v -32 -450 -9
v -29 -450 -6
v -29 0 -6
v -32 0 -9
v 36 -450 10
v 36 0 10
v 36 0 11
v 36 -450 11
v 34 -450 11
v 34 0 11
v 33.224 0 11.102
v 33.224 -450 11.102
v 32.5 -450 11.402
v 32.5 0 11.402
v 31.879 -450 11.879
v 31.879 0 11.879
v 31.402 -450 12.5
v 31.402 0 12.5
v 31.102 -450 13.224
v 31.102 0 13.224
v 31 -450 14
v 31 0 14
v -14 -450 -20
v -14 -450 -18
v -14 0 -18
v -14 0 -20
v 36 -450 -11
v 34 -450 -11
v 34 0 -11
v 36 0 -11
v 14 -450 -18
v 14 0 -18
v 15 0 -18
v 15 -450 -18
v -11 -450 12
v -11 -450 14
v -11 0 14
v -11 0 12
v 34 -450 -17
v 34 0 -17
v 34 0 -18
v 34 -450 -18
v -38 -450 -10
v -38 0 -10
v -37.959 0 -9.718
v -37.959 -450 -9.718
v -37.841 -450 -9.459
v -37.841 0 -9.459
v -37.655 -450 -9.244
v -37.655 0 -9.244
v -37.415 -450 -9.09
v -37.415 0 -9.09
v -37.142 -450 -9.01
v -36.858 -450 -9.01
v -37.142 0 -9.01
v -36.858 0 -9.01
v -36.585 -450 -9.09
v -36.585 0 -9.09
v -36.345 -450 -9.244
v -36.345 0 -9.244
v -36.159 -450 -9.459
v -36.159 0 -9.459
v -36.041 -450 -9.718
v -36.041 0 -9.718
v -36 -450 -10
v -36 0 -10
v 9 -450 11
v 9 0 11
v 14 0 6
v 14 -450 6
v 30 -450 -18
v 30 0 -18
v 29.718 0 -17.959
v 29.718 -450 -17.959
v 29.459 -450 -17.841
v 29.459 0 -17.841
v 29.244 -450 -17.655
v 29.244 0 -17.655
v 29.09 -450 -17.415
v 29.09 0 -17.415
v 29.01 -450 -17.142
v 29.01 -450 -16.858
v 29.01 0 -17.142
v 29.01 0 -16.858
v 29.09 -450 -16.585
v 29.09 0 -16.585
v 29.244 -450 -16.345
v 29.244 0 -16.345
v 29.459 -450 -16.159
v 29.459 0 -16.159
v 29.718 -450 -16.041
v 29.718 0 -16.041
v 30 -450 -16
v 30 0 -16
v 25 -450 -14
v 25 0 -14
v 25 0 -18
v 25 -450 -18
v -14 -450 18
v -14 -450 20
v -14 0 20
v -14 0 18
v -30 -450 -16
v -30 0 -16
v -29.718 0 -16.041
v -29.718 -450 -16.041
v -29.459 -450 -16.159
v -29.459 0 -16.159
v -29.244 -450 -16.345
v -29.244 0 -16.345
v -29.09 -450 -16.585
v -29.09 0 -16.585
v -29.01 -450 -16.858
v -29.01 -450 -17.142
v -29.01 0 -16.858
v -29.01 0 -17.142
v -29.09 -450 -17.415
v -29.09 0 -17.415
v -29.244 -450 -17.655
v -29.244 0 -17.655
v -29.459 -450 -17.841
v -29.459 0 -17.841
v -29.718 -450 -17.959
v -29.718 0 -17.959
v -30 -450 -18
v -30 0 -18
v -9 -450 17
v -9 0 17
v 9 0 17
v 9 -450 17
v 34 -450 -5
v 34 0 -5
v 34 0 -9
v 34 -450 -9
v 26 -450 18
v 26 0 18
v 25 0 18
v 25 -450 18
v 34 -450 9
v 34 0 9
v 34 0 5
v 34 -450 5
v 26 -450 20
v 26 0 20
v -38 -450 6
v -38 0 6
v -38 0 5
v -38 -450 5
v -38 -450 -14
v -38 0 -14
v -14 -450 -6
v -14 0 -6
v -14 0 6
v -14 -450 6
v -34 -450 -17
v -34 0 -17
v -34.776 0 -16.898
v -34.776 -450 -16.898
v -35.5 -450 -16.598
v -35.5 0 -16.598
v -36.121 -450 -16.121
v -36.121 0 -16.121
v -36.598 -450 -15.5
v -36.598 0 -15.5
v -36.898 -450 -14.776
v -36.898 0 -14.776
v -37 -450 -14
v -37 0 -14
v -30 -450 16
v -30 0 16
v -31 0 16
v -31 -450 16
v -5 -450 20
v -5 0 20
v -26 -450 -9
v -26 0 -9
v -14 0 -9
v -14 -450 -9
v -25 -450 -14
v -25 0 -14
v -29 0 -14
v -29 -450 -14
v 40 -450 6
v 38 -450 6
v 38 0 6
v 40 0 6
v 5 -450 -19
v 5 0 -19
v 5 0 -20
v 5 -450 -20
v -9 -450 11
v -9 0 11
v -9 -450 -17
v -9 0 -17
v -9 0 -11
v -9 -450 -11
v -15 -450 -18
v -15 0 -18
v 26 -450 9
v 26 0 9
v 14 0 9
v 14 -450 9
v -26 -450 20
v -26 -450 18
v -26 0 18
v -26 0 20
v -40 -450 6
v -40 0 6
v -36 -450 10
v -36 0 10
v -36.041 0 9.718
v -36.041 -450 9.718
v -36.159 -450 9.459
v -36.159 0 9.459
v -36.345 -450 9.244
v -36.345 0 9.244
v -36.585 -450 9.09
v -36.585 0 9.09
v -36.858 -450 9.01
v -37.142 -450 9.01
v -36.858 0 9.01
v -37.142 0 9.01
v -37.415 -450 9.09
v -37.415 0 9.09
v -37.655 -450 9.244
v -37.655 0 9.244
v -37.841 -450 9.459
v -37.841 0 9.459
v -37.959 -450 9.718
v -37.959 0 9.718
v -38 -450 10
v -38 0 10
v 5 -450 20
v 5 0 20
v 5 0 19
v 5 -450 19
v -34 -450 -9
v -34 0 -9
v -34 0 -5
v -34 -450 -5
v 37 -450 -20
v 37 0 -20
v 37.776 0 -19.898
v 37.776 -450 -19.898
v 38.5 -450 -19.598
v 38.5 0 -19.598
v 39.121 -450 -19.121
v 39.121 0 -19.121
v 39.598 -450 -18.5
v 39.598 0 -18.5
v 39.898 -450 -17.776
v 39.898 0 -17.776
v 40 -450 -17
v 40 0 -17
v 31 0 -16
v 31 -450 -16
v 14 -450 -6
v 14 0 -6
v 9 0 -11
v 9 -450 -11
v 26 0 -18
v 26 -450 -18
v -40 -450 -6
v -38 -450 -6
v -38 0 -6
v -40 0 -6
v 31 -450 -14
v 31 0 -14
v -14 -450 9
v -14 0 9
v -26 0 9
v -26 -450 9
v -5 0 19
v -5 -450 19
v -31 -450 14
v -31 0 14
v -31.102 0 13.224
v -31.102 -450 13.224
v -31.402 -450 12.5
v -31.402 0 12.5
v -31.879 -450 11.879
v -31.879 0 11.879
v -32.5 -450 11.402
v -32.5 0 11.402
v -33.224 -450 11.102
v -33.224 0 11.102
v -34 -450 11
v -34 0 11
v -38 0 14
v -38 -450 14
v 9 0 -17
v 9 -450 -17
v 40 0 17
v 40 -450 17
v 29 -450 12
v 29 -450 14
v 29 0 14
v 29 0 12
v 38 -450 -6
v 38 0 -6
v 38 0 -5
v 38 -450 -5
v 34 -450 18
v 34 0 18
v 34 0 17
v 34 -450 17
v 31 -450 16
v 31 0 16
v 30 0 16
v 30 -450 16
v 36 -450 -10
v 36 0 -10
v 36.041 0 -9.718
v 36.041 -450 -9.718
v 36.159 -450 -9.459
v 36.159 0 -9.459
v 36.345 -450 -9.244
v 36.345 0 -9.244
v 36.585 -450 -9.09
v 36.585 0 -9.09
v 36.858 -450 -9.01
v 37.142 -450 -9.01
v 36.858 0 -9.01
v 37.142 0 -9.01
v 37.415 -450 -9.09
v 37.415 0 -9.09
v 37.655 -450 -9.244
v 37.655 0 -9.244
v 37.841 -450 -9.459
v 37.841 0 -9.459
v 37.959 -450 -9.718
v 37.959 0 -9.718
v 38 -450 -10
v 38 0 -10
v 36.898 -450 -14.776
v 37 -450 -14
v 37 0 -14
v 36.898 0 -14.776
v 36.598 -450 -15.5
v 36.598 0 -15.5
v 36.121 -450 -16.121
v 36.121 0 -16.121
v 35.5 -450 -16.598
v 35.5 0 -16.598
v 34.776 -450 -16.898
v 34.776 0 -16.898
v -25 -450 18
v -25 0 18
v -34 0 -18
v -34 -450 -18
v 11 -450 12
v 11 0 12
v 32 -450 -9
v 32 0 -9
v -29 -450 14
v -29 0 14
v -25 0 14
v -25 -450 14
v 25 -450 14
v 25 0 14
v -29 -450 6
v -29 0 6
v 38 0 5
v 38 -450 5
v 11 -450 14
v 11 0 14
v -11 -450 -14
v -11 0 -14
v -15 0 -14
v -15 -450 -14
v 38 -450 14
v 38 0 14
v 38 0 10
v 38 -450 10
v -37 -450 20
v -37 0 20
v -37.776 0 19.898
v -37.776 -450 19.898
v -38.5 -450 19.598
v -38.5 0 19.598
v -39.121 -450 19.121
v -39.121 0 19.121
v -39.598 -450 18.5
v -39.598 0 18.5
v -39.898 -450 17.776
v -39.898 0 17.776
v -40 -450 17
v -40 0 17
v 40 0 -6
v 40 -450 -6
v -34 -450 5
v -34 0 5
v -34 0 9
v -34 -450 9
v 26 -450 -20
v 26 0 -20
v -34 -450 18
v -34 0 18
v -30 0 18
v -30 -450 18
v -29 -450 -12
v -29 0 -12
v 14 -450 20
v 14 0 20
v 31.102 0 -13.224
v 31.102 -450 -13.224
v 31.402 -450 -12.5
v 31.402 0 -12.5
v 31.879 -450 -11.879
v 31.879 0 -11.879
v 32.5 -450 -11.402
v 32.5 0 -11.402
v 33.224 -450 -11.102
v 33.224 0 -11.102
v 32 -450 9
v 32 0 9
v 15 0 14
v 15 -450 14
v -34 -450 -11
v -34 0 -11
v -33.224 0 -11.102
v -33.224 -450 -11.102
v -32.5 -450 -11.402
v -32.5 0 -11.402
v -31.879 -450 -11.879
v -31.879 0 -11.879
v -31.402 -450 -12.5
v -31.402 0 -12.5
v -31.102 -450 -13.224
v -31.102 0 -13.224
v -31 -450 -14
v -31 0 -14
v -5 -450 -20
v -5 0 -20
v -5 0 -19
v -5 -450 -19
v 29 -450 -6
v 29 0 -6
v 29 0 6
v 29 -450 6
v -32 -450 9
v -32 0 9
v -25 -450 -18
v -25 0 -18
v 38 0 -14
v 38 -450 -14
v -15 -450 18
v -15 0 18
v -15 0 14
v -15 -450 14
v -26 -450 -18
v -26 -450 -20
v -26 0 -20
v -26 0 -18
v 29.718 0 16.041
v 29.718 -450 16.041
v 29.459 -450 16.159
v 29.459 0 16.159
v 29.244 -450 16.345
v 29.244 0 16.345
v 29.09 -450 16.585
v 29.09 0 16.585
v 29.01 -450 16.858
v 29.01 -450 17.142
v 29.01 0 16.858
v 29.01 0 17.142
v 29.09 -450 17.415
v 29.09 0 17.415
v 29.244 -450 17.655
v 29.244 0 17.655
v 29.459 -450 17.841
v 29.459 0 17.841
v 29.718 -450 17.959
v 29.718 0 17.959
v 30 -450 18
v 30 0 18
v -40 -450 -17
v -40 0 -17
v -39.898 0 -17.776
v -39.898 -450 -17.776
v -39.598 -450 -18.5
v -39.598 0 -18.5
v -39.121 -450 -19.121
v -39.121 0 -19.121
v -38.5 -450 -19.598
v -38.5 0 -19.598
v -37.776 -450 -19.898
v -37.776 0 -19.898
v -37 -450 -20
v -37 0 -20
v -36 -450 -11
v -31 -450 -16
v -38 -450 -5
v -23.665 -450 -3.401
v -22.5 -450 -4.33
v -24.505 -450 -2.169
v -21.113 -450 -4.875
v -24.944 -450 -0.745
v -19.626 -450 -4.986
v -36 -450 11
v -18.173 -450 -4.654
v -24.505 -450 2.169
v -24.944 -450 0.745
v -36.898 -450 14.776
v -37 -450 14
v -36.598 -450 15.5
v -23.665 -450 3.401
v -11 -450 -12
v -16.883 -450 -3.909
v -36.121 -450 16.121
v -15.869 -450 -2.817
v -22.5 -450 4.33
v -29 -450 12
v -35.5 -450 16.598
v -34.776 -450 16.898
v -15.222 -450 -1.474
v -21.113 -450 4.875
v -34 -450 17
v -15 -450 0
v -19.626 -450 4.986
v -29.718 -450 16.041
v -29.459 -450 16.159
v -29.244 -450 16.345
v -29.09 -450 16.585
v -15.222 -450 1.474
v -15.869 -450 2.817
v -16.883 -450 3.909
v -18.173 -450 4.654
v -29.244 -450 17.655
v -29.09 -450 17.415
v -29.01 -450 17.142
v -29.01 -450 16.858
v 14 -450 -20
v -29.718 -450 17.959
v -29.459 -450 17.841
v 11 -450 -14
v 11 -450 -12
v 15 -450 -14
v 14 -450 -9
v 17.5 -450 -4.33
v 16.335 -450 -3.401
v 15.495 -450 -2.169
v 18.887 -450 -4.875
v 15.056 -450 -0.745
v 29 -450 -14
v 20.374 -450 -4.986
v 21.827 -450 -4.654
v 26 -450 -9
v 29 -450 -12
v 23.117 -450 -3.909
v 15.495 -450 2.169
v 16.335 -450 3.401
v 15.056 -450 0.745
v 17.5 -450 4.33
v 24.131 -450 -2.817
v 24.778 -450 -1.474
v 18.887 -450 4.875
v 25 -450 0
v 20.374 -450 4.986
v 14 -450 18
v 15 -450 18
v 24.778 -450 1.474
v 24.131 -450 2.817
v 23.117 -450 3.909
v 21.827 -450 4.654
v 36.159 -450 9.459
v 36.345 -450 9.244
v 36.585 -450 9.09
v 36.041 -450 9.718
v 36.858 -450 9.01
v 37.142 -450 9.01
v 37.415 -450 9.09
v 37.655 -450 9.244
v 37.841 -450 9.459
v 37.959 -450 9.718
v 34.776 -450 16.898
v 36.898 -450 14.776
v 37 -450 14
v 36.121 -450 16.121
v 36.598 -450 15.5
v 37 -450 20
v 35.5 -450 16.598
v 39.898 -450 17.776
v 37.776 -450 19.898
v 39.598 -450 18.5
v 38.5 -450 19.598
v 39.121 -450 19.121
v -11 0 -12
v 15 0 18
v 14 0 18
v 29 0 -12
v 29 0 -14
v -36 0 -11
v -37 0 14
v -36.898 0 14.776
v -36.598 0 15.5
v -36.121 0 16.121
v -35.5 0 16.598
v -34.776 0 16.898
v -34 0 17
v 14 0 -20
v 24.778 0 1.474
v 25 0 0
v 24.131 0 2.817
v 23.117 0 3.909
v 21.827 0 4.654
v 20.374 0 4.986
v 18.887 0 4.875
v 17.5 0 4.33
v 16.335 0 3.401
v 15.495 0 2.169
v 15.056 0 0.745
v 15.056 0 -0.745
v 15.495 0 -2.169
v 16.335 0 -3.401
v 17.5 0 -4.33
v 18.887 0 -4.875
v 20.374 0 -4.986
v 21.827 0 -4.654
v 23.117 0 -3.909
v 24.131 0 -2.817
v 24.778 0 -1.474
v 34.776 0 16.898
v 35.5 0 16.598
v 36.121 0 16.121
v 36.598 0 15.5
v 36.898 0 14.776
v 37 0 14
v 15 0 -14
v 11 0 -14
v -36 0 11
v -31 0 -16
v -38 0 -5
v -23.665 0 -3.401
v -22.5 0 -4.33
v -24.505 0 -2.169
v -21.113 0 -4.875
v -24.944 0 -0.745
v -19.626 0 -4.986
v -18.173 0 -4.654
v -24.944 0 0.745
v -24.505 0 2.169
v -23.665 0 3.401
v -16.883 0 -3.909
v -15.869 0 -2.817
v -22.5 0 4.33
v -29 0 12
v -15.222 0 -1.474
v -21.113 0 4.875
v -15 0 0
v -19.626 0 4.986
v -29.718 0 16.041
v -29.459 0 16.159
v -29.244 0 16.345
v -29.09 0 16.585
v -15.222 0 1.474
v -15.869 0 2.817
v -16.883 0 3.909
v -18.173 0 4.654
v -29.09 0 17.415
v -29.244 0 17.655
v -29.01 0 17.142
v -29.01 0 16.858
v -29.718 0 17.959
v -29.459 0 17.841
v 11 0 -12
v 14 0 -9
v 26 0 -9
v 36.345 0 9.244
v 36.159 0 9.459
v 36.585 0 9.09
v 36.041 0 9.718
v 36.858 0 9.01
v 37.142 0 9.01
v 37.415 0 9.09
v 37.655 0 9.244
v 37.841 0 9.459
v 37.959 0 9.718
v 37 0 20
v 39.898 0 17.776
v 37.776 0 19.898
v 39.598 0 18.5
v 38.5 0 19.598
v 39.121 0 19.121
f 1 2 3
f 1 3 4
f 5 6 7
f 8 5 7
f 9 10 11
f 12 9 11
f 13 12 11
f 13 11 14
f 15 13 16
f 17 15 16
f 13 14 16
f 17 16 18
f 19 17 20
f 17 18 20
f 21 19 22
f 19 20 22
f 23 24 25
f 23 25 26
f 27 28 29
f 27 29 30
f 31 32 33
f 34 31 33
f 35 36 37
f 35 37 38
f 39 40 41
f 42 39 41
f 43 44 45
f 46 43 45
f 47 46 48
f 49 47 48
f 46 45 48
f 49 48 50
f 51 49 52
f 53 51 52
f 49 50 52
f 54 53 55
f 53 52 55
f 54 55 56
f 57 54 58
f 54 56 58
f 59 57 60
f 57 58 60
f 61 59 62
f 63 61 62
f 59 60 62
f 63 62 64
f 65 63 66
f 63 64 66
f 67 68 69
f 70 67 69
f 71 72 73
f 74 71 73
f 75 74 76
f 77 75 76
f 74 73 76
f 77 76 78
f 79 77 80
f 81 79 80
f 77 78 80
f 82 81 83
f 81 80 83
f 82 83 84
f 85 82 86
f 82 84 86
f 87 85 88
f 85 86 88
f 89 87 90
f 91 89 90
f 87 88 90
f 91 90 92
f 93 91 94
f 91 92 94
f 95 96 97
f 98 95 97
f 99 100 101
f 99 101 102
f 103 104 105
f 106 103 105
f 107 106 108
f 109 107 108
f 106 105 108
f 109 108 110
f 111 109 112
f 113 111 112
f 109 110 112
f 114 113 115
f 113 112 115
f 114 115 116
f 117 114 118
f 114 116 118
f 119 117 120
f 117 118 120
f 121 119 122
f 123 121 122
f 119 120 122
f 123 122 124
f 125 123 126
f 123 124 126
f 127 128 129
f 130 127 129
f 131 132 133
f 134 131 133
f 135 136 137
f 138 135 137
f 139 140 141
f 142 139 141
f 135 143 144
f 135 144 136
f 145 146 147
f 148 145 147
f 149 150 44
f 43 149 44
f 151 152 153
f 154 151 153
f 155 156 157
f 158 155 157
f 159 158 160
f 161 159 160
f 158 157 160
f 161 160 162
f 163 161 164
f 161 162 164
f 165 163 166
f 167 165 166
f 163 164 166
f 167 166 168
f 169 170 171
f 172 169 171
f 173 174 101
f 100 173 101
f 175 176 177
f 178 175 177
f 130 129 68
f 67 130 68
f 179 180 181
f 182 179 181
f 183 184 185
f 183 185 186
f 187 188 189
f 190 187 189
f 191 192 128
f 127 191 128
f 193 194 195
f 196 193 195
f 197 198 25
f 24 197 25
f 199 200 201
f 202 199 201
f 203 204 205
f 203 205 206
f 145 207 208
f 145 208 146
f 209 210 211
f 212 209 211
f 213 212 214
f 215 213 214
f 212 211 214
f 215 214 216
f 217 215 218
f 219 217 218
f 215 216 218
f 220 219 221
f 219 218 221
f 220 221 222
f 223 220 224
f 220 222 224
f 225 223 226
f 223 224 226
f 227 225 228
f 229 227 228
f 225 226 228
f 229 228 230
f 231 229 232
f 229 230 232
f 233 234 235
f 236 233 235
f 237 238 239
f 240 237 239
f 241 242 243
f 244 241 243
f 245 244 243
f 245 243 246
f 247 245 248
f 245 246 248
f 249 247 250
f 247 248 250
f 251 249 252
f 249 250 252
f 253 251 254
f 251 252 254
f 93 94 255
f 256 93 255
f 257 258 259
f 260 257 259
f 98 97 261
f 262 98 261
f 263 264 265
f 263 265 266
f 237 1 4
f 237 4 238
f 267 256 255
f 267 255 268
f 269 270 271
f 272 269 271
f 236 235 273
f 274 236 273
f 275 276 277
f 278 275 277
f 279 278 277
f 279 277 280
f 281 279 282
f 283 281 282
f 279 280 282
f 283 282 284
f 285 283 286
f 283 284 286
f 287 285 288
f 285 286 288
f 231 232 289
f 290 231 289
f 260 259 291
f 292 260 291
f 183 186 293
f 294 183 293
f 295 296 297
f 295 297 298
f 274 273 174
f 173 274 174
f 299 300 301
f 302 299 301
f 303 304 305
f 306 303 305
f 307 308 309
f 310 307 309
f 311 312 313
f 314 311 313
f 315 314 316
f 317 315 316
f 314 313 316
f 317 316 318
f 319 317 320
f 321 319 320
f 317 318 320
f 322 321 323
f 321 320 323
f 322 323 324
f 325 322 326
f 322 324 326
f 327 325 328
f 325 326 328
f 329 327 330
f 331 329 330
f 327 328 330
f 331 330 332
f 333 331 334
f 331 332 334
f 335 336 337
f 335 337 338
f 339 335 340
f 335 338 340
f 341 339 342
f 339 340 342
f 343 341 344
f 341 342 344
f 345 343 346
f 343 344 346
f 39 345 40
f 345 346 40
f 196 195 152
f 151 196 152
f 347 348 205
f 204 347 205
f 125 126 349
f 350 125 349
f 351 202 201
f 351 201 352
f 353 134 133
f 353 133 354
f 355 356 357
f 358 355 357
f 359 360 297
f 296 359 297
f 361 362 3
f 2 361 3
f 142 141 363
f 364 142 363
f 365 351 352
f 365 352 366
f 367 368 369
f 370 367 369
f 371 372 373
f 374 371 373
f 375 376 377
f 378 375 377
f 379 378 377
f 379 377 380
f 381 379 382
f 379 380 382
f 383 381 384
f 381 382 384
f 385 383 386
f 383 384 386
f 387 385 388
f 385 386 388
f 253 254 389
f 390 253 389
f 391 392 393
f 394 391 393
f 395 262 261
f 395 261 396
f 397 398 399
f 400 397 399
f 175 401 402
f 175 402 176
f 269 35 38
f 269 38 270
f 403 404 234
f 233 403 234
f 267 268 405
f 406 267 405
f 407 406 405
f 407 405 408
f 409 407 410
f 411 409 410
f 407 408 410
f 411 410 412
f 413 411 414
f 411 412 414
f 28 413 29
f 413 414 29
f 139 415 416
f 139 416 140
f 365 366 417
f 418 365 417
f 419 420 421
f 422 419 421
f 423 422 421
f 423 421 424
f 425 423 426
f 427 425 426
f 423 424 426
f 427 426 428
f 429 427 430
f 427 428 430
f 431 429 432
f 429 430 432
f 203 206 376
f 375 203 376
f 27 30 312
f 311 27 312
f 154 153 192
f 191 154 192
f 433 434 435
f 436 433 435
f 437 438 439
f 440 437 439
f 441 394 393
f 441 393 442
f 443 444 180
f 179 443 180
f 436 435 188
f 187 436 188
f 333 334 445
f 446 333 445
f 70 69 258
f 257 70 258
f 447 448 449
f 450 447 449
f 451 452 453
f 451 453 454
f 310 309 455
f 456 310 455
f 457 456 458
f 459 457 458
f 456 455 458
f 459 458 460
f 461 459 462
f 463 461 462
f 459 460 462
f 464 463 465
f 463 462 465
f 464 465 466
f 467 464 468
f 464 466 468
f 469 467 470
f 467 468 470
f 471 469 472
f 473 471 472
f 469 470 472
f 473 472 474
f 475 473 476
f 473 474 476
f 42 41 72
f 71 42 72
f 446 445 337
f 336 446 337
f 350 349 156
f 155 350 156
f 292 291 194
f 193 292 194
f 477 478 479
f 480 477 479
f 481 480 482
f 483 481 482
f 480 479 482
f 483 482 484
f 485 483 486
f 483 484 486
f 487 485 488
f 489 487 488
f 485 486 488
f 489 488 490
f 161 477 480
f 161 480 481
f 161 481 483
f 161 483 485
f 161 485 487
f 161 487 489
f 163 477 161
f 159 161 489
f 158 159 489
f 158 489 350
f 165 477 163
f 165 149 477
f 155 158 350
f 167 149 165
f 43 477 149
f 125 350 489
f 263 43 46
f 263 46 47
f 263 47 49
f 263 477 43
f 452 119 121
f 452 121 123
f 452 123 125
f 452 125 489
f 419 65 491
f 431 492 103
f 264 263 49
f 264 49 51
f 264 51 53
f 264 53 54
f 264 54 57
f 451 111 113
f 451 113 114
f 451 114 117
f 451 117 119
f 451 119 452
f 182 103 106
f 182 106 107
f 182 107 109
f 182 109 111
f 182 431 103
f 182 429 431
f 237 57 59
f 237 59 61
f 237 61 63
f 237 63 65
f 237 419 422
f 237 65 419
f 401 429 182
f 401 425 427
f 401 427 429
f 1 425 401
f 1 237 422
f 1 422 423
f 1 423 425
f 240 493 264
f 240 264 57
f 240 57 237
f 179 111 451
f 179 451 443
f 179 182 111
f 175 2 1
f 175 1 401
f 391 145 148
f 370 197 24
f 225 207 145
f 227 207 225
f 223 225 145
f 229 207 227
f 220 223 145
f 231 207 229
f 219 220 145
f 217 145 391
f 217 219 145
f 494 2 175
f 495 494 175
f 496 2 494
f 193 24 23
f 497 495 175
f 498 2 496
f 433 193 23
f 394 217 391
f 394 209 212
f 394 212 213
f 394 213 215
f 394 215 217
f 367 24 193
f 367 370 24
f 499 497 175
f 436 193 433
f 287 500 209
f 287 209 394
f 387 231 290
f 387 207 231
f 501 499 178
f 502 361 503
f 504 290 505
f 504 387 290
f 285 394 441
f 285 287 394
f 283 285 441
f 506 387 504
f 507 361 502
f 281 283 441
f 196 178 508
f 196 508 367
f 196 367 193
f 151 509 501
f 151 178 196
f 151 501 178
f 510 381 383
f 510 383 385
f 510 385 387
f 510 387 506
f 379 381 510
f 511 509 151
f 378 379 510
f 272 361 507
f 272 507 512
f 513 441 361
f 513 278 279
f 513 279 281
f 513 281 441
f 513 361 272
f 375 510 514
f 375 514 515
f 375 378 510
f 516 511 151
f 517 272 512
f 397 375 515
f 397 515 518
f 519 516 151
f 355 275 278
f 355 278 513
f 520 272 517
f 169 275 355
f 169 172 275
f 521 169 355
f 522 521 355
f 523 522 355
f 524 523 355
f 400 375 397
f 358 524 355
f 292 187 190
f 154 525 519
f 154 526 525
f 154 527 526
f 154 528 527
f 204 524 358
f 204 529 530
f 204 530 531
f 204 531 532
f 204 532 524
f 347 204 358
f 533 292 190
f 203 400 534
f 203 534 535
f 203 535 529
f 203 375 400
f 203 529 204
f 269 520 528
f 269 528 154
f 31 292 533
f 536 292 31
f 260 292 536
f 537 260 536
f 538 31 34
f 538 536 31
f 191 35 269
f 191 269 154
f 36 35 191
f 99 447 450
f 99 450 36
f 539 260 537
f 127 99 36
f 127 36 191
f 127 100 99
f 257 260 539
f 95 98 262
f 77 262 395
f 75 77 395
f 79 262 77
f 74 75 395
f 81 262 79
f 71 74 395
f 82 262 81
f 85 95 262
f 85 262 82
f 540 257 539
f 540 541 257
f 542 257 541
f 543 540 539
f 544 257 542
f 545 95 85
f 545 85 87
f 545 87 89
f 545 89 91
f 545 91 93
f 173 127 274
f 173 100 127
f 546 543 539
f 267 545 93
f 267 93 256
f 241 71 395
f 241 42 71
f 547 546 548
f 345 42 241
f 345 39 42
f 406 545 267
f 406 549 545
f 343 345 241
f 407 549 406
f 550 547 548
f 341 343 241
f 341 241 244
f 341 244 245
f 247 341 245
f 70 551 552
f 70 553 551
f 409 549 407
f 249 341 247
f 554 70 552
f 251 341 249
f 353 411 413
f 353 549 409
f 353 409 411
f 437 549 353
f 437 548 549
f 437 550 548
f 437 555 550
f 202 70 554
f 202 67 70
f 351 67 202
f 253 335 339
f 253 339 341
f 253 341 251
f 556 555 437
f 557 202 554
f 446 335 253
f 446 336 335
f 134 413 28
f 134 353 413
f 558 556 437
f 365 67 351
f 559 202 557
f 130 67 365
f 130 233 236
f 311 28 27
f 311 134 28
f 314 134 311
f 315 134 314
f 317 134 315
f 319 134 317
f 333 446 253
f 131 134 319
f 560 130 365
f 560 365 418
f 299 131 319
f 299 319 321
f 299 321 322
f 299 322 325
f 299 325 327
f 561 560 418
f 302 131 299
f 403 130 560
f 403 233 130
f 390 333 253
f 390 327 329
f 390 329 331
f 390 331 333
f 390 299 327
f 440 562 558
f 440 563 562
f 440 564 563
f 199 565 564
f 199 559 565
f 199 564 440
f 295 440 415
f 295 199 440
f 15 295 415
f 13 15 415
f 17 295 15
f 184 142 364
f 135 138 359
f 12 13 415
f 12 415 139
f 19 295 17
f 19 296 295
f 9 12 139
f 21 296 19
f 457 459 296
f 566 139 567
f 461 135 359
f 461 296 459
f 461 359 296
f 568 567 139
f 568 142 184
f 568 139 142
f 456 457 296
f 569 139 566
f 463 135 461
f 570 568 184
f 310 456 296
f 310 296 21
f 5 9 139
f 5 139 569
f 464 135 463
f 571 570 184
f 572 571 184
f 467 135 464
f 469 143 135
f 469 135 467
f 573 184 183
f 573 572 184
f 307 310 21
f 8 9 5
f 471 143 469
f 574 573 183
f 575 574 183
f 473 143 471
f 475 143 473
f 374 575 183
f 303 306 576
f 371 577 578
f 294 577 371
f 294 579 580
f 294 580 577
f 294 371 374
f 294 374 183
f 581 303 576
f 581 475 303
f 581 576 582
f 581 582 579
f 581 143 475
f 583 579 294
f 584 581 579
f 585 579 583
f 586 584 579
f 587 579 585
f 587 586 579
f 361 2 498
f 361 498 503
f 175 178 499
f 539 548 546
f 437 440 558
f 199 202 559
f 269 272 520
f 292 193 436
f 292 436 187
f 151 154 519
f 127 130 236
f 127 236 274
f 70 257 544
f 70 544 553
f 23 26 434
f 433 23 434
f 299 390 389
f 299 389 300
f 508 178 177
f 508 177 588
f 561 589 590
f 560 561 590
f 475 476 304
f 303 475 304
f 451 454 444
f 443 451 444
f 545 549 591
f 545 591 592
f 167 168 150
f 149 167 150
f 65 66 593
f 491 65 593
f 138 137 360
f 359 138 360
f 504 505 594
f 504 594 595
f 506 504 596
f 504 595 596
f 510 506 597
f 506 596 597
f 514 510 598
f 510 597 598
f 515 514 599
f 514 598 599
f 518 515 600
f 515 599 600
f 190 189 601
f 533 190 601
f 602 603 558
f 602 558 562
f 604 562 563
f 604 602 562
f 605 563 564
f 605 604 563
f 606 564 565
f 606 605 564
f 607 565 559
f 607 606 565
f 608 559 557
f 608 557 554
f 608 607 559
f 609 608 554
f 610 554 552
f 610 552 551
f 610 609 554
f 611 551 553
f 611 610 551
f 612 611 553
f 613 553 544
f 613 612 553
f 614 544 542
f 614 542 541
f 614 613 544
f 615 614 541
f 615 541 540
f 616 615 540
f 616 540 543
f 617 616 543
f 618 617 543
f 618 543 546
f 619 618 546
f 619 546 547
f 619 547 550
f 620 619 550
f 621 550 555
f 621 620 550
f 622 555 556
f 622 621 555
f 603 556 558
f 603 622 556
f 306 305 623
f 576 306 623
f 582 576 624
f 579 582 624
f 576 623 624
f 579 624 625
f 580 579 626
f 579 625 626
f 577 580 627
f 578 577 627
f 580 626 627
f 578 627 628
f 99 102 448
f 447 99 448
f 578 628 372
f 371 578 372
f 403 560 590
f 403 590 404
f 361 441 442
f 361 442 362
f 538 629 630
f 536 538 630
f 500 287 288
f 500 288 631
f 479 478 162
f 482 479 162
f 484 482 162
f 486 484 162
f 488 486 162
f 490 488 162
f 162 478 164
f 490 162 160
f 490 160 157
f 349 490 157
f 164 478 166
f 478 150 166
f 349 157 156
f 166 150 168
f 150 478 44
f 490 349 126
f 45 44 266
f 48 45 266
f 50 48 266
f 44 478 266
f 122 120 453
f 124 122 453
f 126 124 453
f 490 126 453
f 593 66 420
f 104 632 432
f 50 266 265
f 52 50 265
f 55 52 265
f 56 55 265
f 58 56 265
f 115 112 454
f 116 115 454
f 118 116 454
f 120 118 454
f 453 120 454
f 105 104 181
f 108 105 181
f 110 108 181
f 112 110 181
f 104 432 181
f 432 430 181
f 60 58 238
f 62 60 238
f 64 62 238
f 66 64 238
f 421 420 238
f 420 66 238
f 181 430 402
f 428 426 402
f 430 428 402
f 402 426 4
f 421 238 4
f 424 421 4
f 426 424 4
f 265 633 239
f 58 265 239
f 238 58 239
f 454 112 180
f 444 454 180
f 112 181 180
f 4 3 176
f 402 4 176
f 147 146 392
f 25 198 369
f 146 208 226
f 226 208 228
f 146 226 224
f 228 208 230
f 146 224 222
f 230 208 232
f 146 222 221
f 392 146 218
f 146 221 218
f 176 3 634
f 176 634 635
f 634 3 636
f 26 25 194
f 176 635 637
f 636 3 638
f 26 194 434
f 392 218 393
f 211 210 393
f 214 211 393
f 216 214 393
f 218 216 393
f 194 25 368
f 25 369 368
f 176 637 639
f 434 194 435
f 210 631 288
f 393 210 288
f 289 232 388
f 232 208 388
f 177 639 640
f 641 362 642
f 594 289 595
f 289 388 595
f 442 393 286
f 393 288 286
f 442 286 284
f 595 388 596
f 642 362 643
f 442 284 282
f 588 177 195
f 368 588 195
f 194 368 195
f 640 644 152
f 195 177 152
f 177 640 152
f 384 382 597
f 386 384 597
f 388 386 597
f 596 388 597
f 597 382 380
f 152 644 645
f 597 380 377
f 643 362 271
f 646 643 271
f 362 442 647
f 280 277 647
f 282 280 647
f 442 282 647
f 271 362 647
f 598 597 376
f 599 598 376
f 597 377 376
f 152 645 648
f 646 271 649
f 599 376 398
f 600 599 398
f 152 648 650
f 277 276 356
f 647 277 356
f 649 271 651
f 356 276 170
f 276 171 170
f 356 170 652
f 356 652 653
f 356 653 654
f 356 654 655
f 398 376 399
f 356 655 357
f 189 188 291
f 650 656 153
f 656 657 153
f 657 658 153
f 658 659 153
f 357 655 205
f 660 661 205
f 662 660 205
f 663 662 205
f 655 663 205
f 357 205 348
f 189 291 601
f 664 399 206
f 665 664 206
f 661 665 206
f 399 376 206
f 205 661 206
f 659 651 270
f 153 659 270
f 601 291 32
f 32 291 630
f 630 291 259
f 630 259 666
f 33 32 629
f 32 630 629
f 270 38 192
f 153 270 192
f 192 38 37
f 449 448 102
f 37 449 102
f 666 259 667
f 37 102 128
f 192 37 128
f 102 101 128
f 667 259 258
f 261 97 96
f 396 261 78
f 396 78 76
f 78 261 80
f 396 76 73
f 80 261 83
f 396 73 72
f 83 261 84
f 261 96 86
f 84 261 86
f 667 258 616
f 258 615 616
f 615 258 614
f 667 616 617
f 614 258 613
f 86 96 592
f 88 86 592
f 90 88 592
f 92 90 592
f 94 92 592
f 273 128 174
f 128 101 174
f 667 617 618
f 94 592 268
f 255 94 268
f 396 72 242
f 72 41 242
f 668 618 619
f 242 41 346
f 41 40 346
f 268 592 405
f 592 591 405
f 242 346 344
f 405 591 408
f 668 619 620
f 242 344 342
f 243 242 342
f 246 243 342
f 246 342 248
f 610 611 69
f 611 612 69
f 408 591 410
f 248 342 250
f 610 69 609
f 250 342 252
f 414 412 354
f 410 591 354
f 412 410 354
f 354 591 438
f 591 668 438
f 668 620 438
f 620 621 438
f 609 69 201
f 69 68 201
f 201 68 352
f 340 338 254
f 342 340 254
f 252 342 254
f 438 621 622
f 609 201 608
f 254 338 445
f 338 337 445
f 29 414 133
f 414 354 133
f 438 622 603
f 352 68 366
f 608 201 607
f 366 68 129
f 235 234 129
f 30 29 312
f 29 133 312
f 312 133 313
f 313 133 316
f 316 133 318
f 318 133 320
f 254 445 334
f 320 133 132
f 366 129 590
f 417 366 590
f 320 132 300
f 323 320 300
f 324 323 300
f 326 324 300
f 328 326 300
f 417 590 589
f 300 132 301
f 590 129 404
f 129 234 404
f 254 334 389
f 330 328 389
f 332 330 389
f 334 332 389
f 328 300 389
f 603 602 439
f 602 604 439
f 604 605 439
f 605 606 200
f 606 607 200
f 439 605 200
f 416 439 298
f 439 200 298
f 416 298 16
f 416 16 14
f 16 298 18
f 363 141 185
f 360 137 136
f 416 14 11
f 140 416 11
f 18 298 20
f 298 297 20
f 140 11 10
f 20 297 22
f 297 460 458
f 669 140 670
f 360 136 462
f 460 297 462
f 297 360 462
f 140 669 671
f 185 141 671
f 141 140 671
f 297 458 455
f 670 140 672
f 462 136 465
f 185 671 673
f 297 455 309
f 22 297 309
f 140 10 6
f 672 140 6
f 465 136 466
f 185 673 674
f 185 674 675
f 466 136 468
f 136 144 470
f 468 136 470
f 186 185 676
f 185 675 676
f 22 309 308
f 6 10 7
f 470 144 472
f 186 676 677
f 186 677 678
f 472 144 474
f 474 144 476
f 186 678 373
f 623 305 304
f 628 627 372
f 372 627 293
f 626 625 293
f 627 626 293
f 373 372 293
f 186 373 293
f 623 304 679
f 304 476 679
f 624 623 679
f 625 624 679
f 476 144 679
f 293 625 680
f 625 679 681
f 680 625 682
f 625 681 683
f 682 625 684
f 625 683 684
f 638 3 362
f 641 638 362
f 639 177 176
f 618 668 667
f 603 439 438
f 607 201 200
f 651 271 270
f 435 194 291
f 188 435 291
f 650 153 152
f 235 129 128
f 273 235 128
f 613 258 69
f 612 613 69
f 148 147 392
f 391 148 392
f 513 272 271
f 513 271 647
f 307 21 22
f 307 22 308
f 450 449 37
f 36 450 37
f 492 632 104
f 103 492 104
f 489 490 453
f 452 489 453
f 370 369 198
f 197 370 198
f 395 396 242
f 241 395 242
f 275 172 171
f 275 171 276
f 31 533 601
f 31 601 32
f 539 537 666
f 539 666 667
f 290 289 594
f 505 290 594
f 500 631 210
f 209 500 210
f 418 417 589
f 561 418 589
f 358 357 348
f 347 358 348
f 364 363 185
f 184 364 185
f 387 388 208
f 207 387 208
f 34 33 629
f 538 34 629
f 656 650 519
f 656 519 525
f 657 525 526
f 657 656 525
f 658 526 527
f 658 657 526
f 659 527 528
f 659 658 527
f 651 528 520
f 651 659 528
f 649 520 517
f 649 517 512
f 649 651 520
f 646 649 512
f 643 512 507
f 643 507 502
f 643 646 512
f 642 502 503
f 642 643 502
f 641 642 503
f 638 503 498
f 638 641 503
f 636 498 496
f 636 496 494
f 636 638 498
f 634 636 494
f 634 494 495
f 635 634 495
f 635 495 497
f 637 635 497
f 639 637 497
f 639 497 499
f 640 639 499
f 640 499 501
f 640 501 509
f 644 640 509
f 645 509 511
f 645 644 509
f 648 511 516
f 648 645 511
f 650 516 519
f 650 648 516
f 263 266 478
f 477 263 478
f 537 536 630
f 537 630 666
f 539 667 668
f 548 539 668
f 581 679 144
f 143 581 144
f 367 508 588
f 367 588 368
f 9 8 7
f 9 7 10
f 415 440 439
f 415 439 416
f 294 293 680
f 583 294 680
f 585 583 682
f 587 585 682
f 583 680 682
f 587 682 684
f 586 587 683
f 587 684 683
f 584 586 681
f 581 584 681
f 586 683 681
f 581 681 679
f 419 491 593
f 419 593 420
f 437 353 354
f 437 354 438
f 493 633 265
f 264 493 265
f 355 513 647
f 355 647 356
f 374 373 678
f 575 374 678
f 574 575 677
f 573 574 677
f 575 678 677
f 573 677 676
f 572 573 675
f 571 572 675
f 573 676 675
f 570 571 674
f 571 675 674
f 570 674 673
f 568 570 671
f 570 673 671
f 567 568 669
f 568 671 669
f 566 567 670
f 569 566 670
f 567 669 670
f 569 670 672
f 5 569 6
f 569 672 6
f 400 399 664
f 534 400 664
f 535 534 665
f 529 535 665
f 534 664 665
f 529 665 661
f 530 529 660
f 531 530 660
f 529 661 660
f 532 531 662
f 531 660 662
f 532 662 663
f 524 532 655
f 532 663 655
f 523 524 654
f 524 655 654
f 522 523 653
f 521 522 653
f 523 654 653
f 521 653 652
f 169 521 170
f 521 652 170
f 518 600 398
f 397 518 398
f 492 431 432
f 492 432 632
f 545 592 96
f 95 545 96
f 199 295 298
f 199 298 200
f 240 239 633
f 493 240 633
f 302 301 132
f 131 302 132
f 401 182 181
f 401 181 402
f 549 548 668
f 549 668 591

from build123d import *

# Parameters (mm, degrees)
F1_R     = 5
F2_DEPTH = 450


with BuildPart() as f2:
    # F1 (on Front) → F2 (new body)
    with BuildSketch(Plane.XZ):
        with BuildLine():
            Line((-38, 6), (-38, 5))
            Line((-38, 5), (-34, 5))
            Line((-34, 5), (-34, 9))
            Line((-34, 9), (-32, 9))
            Line((-32, 9), (-29, 6))
            Line((-29, 6), (-29, -6))
            Line((-29, -6), (-32, -9))
            Line((-32, -9), (-34, -9))
            Line((-34, -9), (-34, -5))
            Line((-34, -5), (-38, -5))
            Line((-38, -5), (-38, -6))
            Line((-38, -6), (-40, -6))
            Line((-40, -6), (-40, -17))
            ThreePointArc((-40, -17), (-39.1213203436, -19.1213203436), (-37, -20))
            Line((-37, -20), (-26, -20))
            Line((-26, -20), (-26, -18))
            Line((-26, -18), (-25, -18))
            Line((-25, -18), (-25, -14))
            Line((-25, -14), (-29, -14))
            Line((-29, -14), (-29, -12))
            Line((-29, -12), (-26, -9))
            Line((-26, -9), (-14, -9))
            Line((-14, -9), (-11, -12))
            Line((-11, -12), (-11, -14))
            Line((-11, -14), (-15, -14))
            Line((-15, -14), (-15, -18))
            Line((-15, -18), (-14, -18))
            Line((-14, -18), (-14, -20))
            Line((-14, -20), (-5, -20))
            Line((-5, -20), (-5, -19))
            Line((-5, -19), (5, -19))
            Line((5, -19), (5, -20))
            Line((5, -20), (14, -20))
            Line((14, -20), (14, -18))
            Line((14, -18), (15, -18))
            Line((15, -18), (15, -14))
            Line((15, -14), (11, -14))
            Line((11, -14), (11, -12))
            Line((11, -12), (14, -9))
            Line((14, -9), (26, -9))
            Line((26, -9), (29, -12))
            Line((29, -12), (29, -14))
            Line((29, -14), (25, -14))
            Line((25, -14), (25, -18))
            Line((25, -18), (26, -18))
            Line((26, -18), (26, -20))
            Line((26, -20), (37, -20))
            ThreePointArc((37, -20), (39.1213203436, -19.1213203436), (40, -17))
            Line((40, -17), (40, -6))
            Line((40, -6), (38, -6))
            Line((38, -6), (38, -5))
            Line((38, -5), (34, -5))
            Line((34, -5), (34, -9))
            Line((34, -9), (32, -9))
            Line((32, -9), (29, -6))
            Line((29, -6), (29, 6))
            Line((29, 6), (32, 9))
            Line((32, 9), (34, 9))
            Line((34, 9), (34, 5))
            Line((34, 5), (38, 5))
            Line((38, 5), (38, 6))
            Line((38, 6), (40, 6))
            Line((40, 6), (40, 17))
            ThreePointArc((40, 17), (39.1213203436, 19.1213203436), (37, 20))
            Line((37, 20), (26, 20))
            Line((26, 20), (26, 18))
            Line((26, 18), (25, 18))
            Line((25, 18), (25, 14))
            Line((25, 14), (29, 14))
            Line((29, 14), (29, 12))
            Line((29, 12), (26, 9))
            Line((26, 9), (14, 9))
            Line((14, 9), (11, 12))
            Line((11, 12), (11, 14))
            Line((11, 14), (15, 14))
            Line((15, 14), (15, 18))
            Line((15, 18), (14, 18))
            Line((14, 18), (14, 20))
            Line((14, 20), (5, 20))
            Line((5, 20), (5, 19))
            Line((5, 19), (-5, 19))
            Line((-5, 19), (-5, 20))
            Line((-5, 20), (-14, 20))
            Line((-14, 20), (-14, 18))
            Line((-14, 18), (-15, 18))
            Line((-15, 18), (-15, 14))
            Line((-15, 14), (-11, 14))
            Line((-11, 14), (-11, 12))
            Line((-11, 12), (-14, 9))
            Line((-14, 9), (-26, 9))
            Line((-26, 9), (-29, 12))
            Line((-29, 12), (-29, 14))
            Line((-29, 14), (-25, 14))
            Line((-25, 14), (-25, 18))
            Line((-25, 18), (-26, 18))
            Line((-26, 18), (-26, 20))
            Line((-26, 20), (-37, 20))
            ThreePointArc((-37, 20), (-39.1213203436, 19.1213203436), (-40, 17))
            Line((-40, 17), (-40, 6))
            Line((-40, 6), (-38, 6))
        make_face()
        with BuildLine():
            ThreePointArc((-30, -16), (-29, -17), (-30, -18))
            Line((-30, -18), (-34, -18))
            Line((-34, -18), (-34, -17))
            ThreePointArc((-34, -17), (-36.1213203436, -16.1213203436), (-37, -14))
            Line((-37, -14), (-38, -14))
            Line((-38, -14), (-38, -10))
            ThreePointArc((-38, -10), (-37, -9), (-36, -10))
            Line((-36, -10), (-36, -11))
            Line((-36, -11), (-34, -11))
            ThreePointArc((-34, -11), (-31.8786796564, -11.8786796564), (-31, -14))
            Line((-31, -14), (-31, -16))
            Line((-31, -16), (-30, -16))
        make_face(mode=Mode.SUBTRACT)
        with BuildLine():
            ThreePointArc((36, -10), (37, -9), (38, -10))
            Line((38, -10), (38, -14))
            Line((38, -14), (37, -14))
            ThreePointArc((37, -14), (36.1213203436, -16.1213203436), (34, -17))
            Line((34, -17), (34, -18))
            Line((34, -18), (30, -18))
            ThreePointArc((30, -18), (29, -17), (30, -16))
            Line((30, -16), (31, -16))
            Line((31, -16), (31, -14))
            ThreePointArc((31, -14), (31.8786796564, -11.8786796564), (34, -11))
            Line((34, -11), (36, -11))
            Line((36, -11), (36, -10))
        make_face(mode=Mode.SUBTRACT)
        with Locations((-20, 0)):
            Circle(F1_R, mode=Mode.SUBTRACT)
        with BuildLine():
            ThreePointArc((-36, 10), (-37, 9), (-38, 10))
            Line((-38, 10), (-38, 14))
            Line((-38, 14), (-37, 14))
            ThreePointArc((-37, 14), (-36.1213203436, 16.1213203436), (-34, 17))
            Line((-34, 17), (-34, 18))
            Line((-34, 18), (-30, 18))
            ThreePointArc((-30, 18), (-29, 17), (-30, 16))
            Line((-30, 16), (-31, 16))
            Line((-31, 16), (-31, 14))
            ThreePointArc((-31, 14), (-31.8786796564, 11.8786796564), (-34, 11))
            Line((-34, 11), (-36, 11))
            Line((-36, 11), (-36, 10))
        make_face(mode=Mode.SUBTRACT)
        Polygon((9, -17), (-9, -17), (-9, -11), (-14, -6), (-14, 6), (-9, 11), (-9, 17), (9, 17), (9, 11), (14, 6), (14, -6), (9, -11), align=None, mode=Mode.SUBTRACT)
        with Locations((20, 0)):
            Circle(F1_R, mode=Mode.SUBTRACT)
        with BuildLine():
            ThreePointArc((30, 16), (29, 17), (30, 18))
            Line((30, 18), (34, 18))
            Line((34, 18), (34, 17))
            ThreePointArc((34, 17), (36.1213203436, 16.1213203436), (37, 14))
            Line((37, 14), (38, 14))
            Line((38, 14), (38, 10))
            ThreePointArc((38, 10), (37, 9), (36, 10))
            Line((36, 10), (36, 11))
            Line((36, 11), (34, 11))
            ThreePointArc((34, 11), (31.8786796564, 11.8786796564), (31, 14))
            Line((31, 14), (31, 16))
            Line((31, 16), (30, 16))
        make_face(mode=Mode.SUBTRACT)
    extrude(amount=F2_DEPTH)


solid = f2.part
